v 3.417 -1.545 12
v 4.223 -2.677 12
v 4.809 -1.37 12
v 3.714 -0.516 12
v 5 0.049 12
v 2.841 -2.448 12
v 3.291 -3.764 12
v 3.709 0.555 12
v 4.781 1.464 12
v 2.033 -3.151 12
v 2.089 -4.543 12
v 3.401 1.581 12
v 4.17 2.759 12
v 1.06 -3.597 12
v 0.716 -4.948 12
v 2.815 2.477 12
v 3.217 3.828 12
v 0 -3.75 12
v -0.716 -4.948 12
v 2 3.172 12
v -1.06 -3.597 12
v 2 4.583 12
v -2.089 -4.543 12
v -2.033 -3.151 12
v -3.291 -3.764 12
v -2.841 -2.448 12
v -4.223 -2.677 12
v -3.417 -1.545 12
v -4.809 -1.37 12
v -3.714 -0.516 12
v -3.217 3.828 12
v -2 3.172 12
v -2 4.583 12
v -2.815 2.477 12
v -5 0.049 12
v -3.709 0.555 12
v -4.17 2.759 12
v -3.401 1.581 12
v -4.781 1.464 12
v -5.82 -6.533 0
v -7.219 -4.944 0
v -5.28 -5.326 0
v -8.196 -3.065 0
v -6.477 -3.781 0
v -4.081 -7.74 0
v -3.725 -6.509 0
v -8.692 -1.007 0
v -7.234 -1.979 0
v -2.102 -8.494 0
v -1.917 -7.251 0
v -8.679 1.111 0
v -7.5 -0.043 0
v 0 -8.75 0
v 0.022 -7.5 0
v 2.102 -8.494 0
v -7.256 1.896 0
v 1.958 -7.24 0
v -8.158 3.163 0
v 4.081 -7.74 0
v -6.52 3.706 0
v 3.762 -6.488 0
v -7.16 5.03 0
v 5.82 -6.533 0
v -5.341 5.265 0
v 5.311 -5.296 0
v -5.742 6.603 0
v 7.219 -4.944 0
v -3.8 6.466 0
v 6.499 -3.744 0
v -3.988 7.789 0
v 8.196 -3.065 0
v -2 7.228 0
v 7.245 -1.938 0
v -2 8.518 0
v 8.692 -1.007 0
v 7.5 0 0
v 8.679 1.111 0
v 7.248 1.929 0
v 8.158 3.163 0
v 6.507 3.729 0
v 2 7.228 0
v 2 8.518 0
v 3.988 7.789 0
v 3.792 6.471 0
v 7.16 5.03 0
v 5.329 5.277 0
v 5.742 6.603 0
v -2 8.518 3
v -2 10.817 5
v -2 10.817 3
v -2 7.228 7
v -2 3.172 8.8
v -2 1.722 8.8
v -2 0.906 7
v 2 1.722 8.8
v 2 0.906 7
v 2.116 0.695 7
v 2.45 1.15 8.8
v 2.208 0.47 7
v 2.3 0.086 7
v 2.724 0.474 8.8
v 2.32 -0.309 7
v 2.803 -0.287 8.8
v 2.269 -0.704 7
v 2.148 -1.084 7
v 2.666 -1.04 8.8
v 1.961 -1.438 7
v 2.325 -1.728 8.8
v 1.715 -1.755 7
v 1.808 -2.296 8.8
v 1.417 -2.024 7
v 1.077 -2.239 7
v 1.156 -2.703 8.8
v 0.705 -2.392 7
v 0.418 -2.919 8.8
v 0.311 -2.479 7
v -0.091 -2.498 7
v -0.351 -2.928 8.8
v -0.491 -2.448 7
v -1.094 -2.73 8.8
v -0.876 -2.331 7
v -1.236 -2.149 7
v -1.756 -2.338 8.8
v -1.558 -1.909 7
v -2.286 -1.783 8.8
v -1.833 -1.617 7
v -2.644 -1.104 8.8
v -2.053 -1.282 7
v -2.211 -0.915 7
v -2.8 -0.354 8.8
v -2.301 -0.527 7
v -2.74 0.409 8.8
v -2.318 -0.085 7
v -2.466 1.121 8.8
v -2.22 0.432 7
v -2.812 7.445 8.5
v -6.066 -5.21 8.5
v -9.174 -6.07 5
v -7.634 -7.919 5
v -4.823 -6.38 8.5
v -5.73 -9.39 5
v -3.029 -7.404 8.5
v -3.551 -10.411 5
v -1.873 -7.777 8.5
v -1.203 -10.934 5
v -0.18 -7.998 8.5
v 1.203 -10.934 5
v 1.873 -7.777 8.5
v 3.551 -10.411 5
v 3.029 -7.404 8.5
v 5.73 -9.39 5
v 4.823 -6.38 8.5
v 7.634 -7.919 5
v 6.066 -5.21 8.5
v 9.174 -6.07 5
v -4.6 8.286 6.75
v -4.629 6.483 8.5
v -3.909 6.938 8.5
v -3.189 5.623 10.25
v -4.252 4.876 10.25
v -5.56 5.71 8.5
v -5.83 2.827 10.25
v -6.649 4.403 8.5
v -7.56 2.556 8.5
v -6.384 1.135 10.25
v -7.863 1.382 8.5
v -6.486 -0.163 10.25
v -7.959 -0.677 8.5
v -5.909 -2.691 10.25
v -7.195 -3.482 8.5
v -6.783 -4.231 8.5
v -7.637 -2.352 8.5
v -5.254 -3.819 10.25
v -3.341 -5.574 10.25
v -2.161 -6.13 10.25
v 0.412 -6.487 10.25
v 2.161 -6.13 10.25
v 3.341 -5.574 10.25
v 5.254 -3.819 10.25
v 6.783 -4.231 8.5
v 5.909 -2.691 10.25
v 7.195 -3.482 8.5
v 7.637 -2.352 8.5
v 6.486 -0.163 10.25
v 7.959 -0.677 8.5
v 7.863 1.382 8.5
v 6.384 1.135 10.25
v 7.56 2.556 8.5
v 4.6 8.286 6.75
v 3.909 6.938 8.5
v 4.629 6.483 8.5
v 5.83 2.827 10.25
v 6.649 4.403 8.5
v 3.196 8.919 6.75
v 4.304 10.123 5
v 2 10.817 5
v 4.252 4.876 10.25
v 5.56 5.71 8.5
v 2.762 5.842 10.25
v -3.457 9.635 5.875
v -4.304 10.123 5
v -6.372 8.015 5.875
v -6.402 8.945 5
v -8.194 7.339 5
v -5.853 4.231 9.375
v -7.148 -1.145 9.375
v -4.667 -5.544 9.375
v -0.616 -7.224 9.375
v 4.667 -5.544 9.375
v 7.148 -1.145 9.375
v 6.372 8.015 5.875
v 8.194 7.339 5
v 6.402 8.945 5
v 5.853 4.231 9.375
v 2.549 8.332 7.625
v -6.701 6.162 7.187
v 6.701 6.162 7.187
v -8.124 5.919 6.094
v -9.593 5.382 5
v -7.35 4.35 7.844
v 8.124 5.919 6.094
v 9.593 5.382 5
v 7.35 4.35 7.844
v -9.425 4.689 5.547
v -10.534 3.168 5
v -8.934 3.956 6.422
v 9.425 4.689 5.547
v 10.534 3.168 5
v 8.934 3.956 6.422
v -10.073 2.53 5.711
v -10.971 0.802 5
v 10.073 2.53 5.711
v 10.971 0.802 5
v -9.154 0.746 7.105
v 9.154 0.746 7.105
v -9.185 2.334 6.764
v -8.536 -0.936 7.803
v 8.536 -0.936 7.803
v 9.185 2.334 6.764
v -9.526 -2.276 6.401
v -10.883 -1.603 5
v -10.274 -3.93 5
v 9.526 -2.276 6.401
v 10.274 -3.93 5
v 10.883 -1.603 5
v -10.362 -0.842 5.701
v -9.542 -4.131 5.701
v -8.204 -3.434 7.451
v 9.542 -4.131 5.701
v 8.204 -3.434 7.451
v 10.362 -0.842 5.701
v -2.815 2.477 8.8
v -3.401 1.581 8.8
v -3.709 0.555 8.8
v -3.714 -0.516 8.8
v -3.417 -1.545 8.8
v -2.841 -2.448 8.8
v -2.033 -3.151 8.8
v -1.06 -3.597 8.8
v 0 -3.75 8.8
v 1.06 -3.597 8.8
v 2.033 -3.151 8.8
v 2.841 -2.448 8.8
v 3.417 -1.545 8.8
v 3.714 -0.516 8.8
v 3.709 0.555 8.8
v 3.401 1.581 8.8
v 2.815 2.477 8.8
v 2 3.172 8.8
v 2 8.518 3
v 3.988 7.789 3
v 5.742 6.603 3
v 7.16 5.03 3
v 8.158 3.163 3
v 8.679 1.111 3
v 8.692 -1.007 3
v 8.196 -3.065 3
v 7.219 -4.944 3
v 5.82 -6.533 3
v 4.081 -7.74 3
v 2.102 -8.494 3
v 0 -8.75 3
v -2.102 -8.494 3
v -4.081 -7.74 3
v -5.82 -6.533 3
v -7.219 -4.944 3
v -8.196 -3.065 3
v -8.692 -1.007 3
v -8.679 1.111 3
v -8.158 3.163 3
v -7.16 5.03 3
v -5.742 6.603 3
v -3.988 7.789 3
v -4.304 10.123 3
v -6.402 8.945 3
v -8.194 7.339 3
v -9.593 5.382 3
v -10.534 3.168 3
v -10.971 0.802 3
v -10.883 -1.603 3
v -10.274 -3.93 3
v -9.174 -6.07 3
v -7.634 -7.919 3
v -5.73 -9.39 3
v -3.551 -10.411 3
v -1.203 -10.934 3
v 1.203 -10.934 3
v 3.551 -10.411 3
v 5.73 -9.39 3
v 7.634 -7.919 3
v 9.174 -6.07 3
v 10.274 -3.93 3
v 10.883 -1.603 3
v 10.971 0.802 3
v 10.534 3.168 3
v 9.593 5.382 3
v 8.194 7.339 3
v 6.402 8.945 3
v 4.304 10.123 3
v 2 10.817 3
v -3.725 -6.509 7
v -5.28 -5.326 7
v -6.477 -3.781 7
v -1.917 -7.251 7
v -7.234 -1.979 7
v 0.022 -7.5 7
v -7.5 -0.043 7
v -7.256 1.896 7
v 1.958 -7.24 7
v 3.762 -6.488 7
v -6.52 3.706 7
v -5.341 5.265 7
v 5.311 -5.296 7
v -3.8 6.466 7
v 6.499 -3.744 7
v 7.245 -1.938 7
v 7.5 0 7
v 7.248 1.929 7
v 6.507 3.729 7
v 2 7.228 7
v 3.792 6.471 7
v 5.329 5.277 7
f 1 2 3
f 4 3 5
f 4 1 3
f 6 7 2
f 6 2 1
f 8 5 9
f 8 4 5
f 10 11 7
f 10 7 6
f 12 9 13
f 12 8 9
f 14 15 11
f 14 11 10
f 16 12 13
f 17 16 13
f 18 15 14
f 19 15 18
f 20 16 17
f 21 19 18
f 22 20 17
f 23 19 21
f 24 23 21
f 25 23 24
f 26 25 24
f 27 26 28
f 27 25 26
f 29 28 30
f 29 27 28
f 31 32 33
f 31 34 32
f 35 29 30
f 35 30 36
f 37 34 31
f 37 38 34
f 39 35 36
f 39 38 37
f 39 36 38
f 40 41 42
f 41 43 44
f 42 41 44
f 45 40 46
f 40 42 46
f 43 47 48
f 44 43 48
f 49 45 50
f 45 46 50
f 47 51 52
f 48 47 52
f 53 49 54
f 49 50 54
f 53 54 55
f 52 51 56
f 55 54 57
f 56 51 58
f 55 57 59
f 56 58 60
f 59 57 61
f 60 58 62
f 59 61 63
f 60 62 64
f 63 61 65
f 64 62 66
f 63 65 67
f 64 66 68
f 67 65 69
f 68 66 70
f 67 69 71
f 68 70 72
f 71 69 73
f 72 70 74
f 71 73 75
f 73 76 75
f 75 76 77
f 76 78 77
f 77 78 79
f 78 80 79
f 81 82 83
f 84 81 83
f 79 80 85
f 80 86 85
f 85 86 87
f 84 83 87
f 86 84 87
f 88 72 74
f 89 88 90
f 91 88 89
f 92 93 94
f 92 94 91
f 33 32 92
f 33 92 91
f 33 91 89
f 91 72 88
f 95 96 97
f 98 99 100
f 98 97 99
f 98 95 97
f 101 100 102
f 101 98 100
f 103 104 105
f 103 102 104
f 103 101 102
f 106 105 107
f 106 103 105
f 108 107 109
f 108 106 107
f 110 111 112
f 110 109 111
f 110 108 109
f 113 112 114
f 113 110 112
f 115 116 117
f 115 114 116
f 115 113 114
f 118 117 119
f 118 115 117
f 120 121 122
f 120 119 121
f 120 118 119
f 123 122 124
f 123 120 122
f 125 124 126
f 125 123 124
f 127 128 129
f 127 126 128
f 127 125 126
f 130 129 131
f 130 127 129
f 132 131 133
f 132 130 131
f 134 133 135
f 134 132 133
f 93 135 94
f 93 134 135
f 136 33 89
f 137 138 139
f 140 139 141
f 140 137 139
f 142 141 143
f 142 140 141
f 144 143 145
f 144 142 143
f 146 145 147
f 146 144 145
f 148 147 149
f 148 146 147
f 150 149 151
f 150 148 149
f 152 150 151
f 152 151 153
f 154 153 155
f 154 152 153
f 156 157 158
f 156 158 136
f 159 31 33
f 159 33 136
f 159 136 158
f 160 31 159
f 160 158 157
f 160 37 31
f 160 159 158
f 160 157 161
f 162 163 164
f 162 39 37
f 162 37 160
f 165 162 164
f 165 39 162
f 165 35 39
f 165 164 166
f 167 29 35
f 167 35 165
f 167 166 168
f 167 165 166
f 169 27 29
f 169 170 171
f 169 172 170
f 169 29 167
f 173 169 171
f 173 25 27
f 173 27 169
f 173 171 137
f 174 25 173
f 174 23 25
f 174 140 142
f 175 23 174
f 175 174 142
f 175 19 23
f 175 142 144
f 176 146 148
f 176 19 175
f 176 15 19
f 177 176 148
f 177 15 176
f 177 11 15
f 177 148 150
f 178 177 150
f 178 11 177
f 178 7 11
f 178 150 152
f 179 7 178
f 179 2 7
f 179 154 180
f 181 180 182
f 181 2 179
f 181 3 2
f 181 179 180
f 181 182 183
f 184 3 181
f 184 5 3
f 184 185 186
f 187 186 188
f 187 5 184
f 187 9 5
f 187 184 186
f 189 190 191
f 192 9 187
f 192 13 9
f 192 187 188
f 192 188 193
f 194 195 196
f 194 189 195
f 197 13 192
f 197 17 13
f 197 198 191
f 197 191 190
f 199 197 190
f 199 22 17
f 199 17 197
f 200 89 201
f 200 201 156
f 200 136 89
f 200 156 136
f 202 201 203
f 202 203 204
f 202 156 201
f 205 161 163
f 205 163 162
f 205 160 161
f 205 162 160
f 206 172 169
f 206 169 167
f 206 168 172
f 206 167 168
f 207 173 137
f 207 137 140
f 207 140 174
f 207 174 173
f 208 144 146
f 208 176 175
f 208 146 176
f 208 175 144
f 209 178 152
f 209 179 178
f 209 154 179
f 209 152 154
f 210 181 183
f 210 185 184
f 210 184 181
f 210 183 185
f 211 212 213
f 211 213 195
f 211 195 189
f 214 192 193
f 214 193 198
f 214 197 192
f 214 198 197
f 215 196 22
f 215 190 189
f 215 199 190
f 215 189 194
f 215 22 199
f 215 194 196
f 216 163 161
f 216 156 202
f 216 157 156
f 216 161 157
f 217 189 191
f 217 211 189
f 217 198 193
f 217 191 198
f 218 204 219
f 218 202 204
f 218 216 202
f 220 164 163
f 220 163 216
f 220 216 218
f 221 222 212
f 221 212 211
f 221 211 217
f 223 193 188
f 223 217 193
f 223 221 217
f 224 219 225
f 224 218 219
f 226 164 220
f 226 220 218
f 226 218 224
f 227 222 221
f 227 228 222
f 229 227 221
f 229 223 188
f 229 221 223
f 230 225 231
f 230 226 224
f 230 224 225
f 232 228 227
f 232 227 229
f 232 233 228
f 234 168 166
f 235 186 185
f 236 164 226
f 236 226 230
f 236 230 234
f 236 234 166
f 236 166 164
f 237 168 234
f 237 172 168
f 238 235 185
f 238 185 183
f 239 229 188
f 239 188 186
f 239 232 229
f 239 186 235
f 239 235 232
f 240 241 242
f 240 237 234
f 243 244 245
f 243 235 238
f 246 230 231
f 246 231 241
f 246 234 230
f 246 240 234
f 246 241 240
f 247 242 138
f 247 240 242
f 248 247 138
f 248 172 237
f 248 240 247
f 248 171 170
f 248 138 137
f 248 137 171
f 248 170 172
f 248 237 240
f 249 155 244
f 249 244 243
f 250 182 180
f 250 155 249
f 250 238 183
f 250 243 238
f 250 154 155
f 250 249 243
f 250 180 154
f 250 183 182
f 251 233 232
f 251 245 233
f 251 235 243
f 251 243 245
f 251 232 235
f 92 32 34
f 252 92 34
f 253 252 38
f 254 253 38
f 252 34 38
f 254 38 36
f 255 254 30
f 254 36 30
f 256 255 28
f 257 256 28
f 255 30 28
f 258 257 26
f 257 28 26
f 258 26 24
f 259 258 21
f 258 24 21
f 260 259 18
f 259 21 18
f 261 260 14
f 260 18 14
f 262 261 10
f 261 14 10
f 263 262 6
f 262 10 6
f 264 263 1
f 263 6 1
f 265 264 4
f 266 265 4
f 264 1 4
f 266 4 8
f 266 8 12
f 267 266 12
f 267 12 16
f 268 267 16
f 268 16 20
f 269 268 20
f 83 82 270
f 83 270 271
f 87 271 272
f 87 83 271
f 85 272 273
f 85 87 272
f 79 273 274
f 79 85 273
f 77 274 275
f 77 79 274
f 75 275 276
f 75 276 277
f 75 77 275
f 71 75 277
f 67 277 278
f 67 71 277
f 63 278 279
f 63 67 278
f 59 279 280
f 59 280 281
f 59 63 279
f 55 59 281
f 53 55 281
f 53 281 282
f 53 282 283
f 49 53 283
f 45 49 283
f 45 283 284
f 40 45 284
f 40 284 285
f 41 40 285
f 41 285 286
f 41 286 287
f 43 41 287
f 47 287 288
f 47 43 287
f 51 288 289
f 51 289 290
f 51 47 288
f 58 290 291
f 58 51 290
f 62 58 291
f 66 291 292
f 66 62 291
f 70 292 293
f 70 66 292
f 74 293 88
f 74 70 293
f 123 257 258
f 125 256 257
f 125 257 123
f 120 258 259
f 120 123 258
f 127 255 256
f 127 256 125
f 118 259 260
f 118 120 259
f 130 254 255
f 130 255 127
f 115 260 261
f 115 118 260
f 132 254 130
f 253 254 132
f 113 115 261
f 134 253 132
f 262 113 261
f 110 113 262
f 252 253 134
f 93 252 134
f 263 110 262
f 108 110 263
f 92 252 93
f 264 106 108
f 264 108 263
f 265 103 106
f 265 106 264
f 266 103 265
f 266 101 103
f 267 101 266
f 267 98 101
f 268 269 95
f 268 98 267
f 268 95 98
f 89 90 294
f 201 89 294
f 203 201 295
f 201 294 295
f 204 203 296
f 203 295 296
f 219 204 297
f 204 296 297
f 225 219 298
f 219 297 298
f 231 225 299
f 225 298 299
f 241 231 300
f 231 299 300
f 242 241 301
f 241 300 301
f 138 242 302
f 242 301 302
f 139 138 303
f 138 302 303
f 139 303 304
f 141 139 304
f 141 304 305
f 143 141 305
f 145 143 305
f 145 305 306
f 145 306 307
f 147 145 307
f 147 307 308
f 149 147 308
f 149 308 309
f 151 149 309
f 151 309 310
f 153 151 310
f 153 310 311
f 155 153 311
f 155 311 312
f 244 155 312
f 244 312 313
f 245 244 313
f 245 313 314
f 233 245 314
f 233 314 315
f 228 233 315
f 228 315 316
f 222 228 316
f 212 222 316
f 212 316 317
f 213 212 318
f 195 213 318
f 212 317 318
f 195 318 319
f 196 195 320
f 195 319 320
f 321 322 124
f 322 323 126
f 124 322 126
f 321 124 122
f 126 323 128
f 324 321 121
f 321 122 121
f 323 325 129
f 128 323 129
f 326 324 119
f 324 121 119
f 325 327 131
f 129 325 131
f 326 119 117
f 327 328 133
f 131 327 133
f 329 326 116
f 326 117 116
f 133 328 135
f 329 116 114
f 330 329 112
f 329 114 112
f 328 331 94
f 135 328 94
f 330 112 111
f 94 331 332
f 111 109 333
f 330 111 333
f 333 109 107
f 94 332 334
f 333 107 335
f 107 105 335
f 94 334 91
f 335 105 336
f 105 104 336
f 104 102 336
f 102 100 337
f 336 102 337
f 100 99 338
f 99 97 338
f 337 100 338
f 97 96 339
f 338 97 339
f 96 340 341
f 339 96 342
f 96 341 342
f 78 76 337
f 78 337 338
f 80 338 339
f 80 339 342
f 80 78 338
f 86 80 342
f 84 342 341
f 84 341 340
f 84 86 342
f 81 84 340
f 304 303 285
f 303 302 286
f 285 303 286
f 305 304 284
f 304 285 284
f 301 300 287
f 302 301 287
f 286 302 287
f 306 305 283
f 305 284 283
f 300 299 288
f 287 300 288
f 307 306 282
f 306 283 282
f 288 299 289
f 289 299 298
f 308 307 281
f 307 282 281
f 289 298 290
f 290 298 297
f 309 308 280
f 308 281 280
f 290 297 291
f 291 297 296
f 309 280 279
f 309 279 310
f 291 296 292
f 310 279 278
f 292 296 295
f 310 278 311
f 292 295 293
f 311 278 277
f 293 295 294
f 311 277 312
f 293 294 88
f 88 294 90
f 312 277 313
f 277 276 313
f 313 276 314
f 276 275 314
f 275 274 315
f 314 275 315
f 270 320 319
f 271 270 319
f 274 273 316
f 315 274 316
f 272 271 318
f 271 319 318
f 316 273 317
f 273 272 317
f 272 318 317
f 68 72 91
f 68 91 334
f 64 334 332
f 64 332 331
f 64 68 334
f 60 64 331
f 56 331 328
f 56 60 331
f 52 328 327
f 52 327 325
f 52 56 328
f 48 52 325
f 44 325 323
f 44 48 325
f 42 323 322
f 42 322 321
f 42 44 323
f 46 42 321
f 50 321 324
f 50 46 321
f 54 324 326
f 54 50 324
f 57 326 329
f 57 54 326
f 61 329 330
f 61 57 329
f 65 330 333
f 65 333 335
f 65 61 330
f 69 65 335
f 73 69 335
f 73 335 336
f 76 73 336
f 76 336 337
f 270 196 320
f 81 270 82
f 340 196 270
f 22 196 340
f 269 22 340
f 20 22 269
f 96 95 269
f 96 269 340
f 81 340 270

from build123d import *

# Parameters (mm, degrees)
F1_DEPTH = 5
F5_DEPTH = 3
F6_DEPTH = 3.2
F7_DEPTH = 7


with BuildPart() as f1:
    # F0 (on Top) → F1 (new body)
    with BuildSketch(Plane.XY):
        with BuildLine():
            Line((-2, 7.228416), (-2, 8.518363))
            ThreePointArc((-2, 8.518363), (0, -8.75), (2, 8.518363))
            Line((2, 8.518363), (2, 7.228416))
            ThreePointArc((2, 7.228416), (5.968668, 4.541476), (7.5, 0))
            ThreePointArc((7.5, 0), (-4.541476, -5.968668), (-2, 7.228416))
        make_face()
        with BuildLine():
            Line((-2, 8.518363), (-2, 10.816654))
            ThreePointArc((-2, 10.816654), (0, -11), (2, 10.816654))
            Line((2, 10.816654), (2, 8.518363))
            ThreePointArc((2, 8.518363), (0, -8.75), (-2, 8.518363))
        make_face()
        with BuildLine():
            Line((-2, 0), (-2, 7.228416))
            ThreePointArc((-2, 7.228416), (-4.541476, -5.968668), (7.5, 0))
            ThreePointArc((7.5, 0), (5.968668, 4.541476), (2, 7.228416))
            Line((2, 7.228416), (2, 0))
            ThreePointArc((2, 0), (0, -2), (-2, 0))
        make_face()
    extrude(amount=F1_DEPTH)

    # F1_face (on face) → F4 section 0
    with BuildSketch(Plane(origin=(0, -0.708891, 5), x_dir=(1, 0, 0), z_dir=(0, 0, 1))):
        with BuildLine():
            Line((-2, 0.708891), (-2, 11.525545))
            ThreePointArc((-2, 11.525545), (0, -10.291109), (2, 11.525545))
            Line((2, 11.525545), (2, 0.708891))
            ThreePointArc((2, 0.708891), (0, -1.291109), (-2, 0.708891))
        make_face()
    # F3 (on offset) → F4 section 1
    with BuildSketch(Plane.XY.offset(12)):
        with BuildLine():
            ThreePointArc((2, 3.172144), (0, -3.75), (-2, 3.172144))
            Line((-2, 3.172144), (-2, 4.582576))
            ThreePointArc((-2, 4.582576), (0, -5), (2, 4.582576))
            Line((2, 4.582576), (2, 3.172144))
        make_face()
    loft()

    # F0 (on Top) → F5 (cut)
    with BuildSketch(Plane.XY):
        with BuildLine():
            Line((-2, 8.518363), (-2, 10.816654))
            ThreePointArc((-2, 10.816654), (0, -11), (2, 10.816654))
            Line((2, 10.816654), (2, 8.518363))
            ThreePointArc((2, 8.518363), (0, -8.75), (-2, 8.518363))
        make_face()
    extrude(amount=F5_DEPTH, mode=Mode.SUBTRACT)

    # F3 (on offset) → F6 (cut)
    with BuildSketch(Plane.XY.offset(12)):
        with BuildLine():
            ThreePointArc((2, 0), (0, -2), (-2, 0))
            Line((-2, 0), (-2, 3.172144))
            ThreePointArc((-2, 3.172144), (0, -3.75), (2, 3.172144))
            Line((2, 3.172144), (2, 0))
        make_face()
    extrude(amount=-F6_DEPTH, mode=Mode.SUBTRACT)

    # F0 (on Top) → F7 (cut)
    with BuildSketch(Plane.XY):
        with BuildLine():
            Line((-2, 0), (-2, 7.228416))
            ThreePointArc((-2, 7.228416), (-4.541476, -5.968668), (7.5, 0))
            ThreePointArc((7.5, 0), (5.968668, 4.541476), (2, 7.228416))
            Line((2, 7.228416), (2, 0))
            ThreePointArc((2, 0), (0, -2), (-2, 0))
        make_face()
    extrude(amount=F7_DEPTH, mode=Mode.SUBTRACT)


solid = f1.part
